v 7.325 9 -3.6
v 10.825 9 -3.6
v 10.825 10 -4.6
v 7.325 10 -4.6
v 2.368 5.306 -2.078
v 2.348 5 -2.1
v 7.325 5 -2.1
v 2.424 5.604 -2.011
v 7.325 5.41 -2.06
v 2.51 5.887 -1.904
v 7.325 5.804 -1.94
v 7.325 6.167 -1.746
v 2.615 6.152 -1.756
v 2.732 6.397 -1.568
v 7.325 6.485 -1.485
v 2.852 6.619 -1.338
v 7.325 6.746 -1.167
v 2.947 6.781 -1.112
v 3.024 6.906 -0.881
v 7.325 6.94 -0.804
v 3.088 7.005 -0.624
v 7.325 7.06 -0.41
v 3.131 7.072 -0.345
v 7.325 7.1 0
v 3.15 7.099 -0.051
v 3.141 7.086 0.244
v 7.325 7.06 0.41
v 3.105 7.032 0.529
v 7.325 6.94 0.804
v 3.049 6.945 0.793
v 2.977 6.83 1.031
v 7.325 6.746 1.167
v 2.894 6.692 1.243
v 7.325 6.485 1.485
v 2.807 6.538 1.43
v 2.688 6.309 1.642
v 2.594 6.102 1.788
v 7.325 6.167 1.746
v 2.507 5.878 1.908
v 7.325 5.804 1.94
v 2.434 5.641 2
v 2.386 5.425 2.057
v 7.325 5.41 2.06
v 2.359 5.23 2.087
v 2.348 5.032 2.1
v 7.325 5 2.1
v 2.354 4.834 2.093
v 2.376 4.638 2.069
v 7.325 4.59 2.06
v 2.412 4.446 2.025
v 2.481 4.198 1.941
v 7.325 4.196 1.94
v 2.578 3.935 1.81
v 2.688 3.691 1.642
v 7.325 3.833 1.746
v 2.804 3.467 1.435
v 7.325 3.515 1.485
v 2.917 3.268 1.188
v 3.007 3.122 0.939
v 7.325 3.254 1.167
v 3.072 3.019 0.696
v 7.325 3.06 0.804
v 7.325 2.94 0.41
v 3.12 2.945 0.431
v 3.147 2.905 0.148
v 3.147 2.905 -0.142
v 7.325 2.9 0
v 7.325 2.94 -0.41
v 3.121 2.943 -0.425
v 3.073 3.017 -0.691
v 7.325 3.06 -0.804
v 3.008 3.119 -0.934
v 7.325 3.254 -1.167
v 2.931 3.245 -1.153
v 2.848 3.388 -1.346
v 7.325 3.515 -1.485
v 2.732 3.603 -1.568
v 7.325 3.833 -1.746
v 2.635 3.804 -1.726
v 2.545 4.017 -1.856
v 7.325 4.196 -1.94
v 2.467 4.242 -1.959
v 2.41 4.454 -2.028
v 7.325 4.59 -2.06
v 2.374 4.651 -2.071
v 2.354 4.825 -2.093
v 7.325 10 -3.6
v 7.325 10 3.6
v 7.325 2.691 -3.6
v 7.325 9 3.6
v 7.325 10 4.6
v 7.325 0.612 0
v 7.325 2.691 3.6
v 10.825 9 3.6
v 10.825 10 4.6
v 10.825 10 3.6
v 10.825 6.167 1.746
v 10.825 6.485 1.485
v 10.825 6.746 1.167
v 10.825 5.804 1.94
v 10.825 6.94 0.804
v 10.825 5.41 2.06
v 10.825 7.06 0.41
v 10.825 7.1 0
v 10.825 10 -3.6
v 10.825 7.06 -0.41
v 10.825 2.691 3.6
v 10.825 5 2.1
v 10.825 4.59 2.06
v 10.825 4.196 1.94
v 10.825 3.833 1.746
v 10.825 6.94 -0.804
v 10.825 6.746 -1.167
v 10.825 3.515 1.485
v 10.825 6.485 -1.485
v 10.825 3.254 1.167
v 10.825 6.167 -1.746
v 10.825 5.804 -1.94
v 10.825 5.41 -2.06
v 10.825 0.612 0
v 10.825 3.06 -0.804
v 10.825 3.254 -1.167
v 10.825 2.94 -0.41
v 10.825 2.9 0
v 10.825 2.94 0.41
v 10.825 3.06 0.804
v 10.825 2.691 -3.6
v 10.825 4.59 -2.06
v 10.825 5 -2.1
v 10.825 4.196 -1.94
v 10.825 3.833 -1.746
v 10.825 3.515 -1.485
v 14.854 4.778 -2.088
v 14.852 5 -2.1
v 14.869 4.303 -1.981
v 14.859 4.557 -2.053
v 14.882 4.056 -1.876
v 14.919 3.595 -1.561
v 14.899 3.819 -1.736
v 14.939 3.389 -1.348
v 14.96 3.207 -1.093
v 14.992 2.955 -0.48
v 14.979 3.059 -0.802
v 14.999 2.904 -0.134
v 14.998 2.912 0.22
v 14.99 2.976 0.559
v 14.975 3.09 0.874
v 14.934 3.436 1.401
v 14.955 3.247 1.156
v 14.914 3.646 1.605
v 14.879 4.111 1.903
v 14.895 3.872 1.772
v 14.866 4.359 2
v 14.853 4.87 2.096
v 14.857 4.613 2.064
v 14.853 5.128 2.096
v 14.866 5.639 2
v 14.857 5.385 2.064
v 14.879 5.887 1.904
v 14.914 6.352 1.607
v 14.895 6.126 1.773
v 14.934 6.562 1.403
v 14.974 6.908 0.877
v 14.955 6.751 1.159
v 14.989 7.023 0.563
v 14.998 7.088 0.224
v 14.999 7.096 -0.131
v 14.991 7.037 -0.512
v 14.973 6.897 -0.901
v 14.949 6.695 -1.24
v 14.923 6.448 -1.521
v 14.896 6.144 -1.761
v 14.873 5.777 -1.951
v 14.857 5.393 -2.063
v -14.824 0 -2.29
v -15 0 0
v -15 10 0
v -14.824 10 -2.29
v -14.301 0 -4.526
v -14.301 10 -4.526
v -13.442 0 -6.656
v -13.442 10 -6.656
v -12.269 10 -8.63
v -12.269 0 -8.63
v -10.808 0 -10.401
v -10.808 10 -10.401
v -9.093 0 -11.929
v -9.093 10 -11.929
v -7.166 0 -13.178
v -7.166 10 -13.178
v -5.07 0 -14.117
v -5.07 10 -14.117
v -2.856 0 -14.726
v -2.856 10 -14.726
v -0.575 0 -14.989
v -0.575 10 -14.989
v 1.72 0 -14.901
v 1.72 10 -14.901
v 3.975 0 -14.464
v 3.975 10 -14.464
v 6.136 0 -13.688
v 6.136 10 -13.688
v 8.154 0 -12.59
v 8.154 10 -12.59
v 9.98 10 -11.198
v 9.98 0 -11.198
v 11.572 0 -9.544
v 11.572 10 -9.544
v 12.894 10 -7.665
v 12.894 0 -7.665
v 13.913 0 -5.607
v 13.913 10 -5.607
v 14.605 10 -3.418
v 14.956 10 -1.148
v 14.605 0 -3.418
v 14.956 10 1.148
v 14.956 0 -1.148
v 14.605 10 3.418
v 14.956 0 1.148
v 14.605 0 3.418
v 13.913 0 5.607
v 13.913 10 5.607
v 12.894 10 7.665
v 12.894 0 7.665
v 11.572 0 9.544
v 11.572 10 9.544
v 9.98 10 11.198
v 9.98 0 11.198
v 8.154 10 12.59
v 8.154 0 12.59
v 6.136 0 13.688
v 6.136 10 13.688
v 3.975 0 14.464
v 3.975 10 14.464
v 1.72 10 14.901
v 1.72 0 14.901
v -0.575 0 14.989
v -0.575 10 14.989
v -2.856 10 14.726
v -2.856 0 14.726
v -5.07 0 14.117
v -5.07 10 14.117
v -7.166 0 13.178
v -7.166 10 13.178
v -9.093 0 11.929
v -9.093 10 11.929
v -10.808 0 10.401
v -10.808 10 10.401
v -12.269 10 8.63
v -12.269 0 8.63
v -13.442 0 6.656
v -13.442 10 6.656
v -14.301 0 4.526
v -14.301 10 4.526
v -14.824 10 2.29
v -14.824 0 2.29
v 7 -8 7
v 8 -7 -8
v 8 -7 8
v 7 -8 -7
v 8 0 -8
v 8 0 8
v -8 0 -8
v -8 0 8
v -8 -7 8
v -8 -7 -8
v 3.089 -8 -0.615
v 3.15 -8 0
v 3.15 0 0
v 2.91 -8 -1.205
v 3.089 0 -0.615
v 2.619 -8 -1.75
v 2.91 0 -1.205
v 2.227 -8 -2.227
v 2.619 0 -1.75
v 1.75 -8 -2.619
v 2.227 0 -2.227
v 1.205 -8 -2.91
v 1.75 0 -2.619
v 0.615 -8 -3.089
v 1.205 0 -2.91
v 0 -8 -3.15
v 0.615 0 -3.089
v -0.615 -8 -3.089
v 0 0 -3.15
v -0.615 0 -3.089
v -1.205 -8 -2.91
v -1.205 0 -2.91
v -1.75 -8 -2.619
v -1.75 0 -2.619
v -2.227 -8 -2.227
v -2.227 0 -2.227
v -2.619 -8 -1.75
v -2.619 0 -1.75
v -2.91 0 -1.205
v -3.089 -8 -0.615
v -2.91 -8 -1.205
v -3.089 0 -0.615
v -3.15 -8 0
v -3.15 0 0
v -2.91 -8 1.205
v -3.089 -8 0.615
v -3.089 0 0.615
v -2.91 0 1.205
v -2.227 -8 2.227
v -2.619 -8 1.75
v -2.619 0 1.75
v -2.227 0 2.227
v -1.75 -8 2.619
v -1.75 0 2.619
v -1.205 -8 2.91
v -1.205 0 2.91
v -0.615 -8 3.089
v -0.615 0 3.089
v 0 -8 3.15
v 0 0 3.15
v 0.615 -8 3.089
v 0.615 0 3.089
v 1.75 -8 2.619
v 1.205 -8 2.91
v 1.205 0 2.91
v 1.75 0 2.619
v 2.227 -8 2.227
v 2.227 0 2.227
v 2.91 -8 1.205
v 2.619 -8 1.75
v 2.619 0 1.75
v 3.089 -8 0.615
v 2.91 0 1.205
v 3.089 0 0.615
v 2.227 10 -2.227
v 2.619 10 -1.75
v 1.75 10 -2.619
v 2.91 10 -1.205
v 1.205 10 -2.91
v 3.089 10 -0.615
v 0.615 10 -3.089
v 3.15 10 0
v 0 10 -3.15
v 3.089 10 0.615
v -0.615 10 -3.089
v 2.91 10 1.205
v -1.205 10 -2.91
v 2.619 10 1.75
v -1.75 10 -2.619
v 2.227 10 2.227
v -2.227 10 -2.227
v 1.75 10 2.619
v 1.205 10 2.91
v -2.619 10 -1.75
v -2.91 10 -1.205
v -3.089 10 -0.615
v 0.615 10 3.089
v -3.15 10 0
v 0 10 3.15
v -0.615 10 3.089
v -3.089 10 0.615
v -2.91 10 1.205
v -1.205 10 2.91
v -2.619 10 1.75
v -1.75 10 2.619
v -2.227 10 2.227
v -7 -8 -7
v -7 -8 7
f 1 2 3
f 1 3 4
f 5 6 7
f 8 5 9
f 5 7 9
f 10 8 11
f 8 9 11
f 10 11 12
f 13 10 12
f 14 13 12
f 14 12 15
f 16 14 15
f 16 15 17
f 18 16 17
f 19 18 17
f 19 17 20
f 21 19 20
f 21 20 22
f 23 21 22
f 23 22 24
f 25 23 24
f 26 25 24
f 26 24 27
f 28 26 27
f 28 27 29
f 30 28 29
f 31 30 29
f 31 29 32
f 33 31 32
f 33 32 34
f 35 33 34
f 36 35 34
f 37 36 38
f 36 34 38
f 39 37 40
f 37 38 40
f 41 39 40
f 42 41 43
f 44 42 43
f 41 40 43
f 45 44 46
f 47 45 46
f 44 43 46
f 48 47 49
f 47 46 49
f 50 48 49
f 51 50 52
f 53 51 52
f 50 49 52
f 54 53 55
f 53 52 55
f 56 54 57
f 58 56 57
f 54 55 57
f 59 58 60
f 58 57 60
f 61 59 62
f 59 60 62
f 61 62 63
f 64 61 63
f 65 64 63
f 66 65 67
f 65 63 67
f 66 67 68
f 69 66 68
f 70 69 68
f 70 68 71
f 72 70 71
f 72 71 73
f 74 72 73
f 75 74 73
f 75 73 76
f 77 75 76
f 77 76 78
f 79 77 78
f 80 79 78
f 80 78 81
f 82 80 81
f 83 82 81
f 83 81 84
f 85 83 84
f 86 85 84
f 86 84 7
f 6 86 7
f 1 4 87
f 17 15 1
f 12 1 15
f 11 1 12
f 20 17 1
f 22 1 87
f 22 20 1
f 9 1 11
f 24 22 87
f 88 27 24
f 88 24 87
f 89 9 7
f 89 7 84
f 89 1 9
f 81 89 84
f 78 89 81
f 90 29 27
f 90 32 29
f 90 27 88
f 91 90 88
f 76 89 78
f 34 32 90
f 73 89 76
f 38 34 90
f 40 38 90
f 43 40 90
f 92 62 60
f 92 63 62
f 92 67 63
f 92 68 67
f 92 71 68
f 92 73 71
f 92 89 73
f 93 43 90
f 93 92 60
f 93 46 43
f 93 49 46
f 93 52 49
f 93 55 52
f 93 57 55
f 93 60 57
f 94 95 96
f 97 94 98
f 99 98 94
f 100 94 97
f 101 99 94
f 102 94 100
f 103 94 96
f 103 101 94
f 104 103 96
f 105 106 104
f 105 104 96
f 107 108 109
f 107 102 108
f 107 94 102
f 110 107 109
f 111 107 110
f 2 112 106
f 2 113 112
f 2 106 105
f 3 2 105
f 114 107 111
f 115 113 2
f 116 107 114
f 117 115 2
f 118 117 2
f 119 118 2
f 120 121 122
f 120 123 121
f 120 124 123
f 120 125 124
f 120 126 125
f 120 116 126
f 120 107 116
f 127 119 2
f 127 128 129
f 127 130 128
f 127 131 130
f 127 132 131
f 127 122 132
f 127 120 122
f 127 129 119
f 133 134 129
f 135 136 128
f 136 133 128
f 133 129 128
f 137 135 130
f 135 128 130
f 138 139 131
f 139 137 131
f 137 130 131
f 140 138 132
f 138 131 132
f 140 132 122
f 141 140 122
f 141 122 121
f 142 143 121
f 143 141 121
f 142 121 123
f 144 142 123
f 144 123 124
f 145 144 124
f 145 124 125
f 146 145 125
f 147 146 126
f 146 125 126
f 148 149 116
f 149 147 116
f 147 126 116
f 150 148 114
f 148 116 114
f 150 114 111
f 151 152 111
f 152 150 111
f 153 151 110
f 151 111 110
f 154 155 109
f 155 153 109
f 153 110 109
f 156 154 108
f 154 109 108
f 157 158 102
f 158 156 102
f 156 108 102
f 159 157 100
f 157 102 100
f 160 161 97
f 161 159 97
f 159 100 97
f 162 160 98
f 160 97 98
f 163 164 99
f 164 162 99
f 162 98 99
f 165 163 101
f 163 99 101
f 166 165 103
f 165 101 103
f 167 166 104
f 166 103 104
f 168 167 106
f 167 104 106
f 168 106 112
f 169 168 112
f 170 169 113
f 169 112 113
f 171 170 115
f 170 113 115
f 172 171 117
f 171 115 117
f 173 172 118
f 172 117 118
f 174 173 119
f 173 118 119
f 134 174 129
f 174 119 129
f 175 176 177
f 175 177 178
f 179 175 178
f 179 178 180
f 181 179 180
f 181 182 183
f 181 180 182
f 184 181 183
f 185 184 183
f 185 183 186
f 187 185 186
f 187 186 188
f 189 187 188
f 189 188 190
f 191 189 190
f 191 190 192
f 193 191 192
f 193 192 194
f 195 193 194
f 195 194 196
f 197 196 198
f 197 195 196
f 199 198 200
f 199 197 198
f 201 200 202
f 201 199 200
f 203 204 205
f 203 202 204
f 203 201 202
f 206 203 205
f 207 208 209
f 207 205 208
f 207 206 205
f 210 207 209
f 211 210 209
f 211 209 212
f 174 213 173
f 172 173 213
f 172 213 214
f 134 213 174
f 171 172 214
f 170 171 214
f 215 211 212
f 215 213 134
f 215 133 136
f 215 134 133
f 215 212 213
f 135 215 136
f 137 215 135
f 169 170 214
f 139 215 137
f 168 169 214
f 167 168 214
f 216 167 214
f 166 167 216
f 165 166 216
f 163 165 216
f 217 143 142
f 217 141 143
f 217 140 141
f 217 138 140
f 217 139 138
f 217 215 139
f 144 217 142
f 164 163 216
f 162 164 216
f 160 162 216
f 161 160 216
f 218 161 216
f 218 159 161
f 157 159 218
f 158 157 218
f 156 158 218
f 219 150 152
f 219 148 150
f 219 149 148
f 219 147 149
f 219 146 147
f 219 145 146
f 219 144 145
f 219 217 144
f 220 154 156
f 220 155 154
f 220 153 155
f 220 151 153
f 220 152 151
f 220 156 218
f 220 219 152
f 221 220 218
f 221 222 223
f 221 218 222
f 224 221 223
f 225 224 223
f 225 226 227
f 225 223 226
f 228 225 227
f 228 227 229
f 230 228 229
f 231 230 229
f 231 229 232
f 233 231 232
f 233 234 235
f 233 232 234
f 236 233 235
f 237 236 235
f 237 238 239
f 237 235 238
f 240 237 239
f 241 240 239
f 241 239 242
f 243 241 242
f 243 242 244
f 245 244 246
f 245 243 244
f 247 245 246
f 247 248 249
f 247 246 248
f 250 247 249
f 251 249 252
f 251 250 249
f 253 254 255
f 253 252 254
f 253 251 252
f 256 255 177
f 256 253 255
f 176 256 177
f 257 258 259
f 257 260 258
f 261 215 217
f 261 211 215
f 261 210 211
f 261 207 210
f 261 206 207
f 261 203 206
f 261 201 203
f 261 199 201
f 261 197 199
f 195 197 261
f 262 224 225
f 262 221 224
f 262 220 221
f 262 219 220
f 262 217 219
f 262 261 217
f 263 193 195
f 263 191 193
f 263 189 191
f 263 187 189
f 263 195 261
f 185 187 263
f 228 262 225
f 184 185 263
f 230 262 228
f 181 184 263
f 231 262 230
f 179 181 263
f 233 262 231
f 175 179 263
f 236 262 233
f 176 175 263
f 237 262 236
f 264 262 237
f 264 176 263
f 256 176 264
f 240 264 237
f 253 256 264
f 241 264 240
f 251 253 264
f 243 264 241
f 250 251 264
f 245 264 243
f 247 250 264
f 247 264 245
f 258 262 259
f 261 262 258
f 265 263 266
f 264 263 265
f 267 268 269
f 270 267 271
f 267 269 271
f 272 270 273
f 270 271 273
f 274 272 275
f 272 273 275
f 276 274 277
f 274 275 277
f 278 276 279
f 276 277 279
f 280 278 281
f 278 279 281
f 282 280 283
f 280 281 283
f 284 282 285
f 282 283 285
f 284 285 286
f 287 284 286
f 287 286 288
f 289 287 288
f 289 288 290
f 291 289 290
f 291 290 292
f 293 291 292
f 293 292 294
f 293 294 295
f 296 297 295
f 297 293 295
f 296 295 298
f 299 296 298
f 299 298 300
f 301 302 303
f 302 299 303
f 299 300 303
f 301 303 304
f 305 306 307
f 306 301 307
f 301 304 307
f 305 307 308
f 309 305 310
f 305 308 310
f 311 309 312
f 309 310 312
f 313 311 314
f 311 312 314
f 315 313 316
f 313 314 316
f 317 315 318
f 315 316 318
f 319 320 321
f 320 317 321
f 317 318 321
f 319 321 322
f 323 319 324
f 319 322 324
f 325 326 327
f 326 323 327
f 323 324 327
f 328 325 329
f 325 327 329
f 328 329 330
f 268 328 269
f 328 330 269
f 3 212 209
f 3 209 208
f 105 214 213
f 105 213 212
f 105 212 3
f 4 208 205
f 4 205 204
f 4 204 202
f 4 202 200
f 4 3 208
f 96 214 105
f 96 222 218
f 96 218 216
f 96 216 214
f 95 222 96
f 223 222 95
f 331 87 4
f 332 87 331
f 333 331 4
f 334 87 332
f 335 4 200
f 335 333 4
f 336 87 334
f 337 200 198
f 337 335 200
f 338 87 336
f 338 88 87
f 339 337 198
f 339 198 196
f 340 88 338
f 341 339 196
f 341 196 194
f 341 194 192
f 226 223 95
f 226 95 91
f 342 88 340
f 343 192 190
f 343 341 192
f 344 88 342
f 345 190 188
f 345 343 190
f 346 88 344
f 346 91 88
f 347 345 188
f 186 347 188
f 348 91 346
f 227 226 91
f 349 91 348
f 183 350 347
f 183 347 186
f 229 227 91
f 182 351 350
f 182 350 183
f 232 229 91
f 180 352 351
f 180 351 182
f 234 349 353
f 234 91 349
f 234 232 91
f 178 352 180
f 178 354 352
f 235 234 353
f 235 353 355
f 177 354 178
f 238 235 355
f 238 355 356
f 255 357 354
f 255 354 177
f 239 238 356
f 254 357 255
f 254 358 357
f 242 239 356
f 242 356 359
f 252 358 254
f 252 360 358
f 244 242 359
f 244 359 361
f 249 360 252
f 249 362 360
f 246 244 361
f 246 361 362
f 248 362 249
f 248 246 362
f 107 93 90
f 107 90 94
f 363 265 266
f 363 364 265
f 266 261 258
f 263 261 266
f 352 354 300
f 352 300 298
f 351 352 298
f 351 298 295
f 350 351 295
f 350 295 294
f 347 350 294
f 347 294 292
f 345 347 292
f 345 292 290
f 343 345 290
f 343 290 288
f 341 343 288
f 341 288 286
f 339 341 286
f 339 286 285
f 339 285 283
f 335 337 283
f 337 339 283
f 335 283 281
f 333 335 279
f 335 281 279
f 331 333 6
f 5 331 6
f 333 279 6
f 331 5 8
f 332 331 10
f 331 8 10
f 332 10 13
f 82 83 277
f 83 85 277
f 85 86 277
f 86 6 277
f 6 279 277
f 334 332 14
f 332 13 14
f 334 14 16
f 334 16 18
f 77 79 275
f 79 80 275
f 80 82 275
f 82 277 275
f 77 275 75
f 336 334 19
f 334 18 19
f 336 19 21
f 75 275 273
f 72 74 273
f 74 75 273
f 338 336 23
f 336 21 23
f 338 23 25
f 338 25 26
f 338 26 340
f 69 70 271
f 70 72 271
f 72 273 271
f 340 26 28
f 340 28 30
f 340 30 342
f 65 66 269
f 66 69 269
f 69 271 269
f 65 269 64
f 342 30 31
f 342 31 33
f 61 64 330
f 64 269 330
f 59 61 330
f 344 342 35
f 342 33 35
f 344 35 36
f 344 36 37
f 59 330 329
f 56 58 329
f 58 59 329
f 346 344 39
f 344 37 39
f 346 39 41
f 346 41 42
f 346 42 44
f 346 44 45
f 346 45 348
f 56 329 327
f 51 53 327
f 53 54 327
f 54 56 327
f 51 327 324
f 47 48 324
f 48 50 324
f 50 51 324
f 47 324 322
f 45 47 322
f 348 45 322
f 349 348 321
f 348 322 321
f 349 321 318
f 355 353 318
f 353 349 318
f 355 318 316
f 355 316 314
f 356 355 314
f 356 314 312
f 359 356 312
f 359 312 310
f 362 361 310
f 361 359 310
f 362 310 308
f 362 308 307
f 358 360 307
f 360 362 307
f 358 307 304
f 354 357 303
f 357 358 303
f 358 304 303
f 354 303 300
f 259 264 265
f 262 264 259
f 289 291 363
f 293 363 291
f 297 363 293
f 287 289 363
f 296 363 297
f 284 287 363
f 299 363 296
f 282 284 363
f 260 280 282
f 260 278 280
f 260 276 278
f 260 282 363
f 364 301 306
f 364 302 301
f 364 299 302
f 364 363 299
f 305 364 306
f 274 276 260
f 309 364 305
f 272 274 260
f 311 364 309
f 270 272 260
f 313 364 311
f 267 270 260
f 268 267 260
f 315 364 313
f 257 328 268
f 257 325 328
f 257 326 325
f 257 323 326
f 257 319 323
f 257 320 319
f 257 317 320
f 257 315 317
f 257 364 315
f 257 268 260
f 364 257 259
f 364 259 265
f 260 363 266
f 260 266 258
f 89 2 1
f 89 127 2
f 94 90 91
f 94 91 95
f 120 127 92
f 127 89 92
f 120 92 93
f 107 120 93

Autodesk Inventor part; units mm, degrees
ref_plane "YZ Plane" through (0, 0, 0) normal (1, 0, 0) x (0, 1, 0)
ref_plane "XZ Plane" through (0, 0, 0) normal (0, 1, 0) x (-1, 0, 0)
ref_plane "XY Plane" through (0, 0, 0) normal (0, 0, 1) x (1, 0, 0)
sketch "Boceto1" plane through (0, 0, 0) normal (0, 1, 0) x (-1, 0, 0)
  circle A0 centre (0, 0) radius 3.15
  circle A1 centre (0, 0) radius 15
  line L0 (-7.325, 3.6) -> (-10.825, 3.6)
  line L1 (-10.825, 3.6) -> (-10.825, -3.6)
  line L2 (-10.825, -3.6) -> (-7.325, -3.6)
  line L3 (-7.325, -3.6) -> (-7.325, 3.6)
  circle A2 centre (0, 0) radius 9.763 construction
  line L4 (6.7802, -4.5436) -> (0.5448, -8.1436)
  line L5 (8.5302, -7.5747) -> (6.7802, -4.5436)
  line L6 (2.2948, -11.1747) -> (8.5302, -7.5747)
  line L7 (0.5448, -8.1436) -> (2.2948, -11.1747)
  line L8 (0.5448, 8.1436) -> (6.7802, 4.5436)
  line L9 (2.2948, 11.1747) -> (0.5448, 8.1436)
  line L10 (8.5302, 7.5747) -> (2.2948, 11.1747)
  line L11 (6.7802, 4.5436) -> (8.5302, 7.5747)
  point P0 (-7.325, 0)
  point P1 (-9.075, 3.6)
  point P2 (3.6625, -6.3436)
  point P3 (1.4198, -9.6592)
  point P4 (3.6625, 6.3436)
  point P5 (7.6552, 6.0592)
  dimension "d0" = 6.3
  dimension "tuerca" = 7.2
  dimension "d2" = 11.85
  dimension "d3" = 6.613
  dimension "d4" = 3.5
  dimension "d18" = 360
  dimension "d26" = 30
  dimension "d27" = 4.175
  dimension "d28" = 4.175
extrude "Extrusión1" add sketch "Boceto1" along normal blind 10 contours A1 | L5 L6 L7 L4 | L9 L10 L11 L8
sketch "Boceto2" plane through (7.325, 0, -3.6) normal (1, 0, 0) x (0, 0, -1)
  line L0 (0, 0) -> (-7.2, 0) projected
  line L1 (0, 0) -> (0, 10) construction
  line L2 (-7.2, 10) -> (0, 10) construction
  line L3 (-7.2, 0) -> (-7.2, 10) construction
  line L4 (-7.2, 0) -> (0, 10) construction
  circle A0 centre (-3.6, 5) radius 2.1
  line L5 (0, 2.6906) -> (-4.6603, 0)
  line L6 (-2.5397, 0) -> (-7.2, 2.6906)
  line L7 (-7.2, 2.6906) -> (-7.2, 0)
  line L8 (0, 2.6906) -> (0, 0)
  point P0 (-3.6, 0)
  dimension "d7" = 4.2
  dimension "d8" = 120
  dimension "d9" = 3.8
extrude "Extrusión2" cut sketch "Boceto2" along normal mid plane 16 contours A0
extrude "Extrusión3" add sketch "Boceto2" along normal up to next contours L0 L6 L5 L8 | L0 L5 L6 | L0 L7 L6 L5
sketch "Boceto3" plane through (0, 0, 0) normal (0, -1, 0) x (1, 0, 0)
  circle A0 centre (0, 0) radius 3.15 projected
  circle A1 centre (0, 0) radius 27.5
  line L0 (-8, 8) -> (8, 8)
  line L1 (8, 8) -> (8, -8)
  line L2 (8, -8) -> (-8, -8)
  line L3 (-8, -8) -> (-8, 8)
  point P0 (-8, 0)
  point P1 (0, 8)
  dimension "d32" = 16
  dimension "d33" = 55
extrude "Extrusión4" add sketch "Boceto3" along normal blind 8 contours L0 L1 L2 L3
chamfer "Chaflán1" distance 1 angle 45 2 edges at (9.075, 10, 3.6) (9.075, 10, -3.6)
chamfer "Chaflán3" distance 1 angle 45 4 edges at (0, -8, 8) (-8, -8, 0) (0, -8, -8) (8, -8, 0)
equation "\"d28\" = d27"
properties part number "dado polea"
